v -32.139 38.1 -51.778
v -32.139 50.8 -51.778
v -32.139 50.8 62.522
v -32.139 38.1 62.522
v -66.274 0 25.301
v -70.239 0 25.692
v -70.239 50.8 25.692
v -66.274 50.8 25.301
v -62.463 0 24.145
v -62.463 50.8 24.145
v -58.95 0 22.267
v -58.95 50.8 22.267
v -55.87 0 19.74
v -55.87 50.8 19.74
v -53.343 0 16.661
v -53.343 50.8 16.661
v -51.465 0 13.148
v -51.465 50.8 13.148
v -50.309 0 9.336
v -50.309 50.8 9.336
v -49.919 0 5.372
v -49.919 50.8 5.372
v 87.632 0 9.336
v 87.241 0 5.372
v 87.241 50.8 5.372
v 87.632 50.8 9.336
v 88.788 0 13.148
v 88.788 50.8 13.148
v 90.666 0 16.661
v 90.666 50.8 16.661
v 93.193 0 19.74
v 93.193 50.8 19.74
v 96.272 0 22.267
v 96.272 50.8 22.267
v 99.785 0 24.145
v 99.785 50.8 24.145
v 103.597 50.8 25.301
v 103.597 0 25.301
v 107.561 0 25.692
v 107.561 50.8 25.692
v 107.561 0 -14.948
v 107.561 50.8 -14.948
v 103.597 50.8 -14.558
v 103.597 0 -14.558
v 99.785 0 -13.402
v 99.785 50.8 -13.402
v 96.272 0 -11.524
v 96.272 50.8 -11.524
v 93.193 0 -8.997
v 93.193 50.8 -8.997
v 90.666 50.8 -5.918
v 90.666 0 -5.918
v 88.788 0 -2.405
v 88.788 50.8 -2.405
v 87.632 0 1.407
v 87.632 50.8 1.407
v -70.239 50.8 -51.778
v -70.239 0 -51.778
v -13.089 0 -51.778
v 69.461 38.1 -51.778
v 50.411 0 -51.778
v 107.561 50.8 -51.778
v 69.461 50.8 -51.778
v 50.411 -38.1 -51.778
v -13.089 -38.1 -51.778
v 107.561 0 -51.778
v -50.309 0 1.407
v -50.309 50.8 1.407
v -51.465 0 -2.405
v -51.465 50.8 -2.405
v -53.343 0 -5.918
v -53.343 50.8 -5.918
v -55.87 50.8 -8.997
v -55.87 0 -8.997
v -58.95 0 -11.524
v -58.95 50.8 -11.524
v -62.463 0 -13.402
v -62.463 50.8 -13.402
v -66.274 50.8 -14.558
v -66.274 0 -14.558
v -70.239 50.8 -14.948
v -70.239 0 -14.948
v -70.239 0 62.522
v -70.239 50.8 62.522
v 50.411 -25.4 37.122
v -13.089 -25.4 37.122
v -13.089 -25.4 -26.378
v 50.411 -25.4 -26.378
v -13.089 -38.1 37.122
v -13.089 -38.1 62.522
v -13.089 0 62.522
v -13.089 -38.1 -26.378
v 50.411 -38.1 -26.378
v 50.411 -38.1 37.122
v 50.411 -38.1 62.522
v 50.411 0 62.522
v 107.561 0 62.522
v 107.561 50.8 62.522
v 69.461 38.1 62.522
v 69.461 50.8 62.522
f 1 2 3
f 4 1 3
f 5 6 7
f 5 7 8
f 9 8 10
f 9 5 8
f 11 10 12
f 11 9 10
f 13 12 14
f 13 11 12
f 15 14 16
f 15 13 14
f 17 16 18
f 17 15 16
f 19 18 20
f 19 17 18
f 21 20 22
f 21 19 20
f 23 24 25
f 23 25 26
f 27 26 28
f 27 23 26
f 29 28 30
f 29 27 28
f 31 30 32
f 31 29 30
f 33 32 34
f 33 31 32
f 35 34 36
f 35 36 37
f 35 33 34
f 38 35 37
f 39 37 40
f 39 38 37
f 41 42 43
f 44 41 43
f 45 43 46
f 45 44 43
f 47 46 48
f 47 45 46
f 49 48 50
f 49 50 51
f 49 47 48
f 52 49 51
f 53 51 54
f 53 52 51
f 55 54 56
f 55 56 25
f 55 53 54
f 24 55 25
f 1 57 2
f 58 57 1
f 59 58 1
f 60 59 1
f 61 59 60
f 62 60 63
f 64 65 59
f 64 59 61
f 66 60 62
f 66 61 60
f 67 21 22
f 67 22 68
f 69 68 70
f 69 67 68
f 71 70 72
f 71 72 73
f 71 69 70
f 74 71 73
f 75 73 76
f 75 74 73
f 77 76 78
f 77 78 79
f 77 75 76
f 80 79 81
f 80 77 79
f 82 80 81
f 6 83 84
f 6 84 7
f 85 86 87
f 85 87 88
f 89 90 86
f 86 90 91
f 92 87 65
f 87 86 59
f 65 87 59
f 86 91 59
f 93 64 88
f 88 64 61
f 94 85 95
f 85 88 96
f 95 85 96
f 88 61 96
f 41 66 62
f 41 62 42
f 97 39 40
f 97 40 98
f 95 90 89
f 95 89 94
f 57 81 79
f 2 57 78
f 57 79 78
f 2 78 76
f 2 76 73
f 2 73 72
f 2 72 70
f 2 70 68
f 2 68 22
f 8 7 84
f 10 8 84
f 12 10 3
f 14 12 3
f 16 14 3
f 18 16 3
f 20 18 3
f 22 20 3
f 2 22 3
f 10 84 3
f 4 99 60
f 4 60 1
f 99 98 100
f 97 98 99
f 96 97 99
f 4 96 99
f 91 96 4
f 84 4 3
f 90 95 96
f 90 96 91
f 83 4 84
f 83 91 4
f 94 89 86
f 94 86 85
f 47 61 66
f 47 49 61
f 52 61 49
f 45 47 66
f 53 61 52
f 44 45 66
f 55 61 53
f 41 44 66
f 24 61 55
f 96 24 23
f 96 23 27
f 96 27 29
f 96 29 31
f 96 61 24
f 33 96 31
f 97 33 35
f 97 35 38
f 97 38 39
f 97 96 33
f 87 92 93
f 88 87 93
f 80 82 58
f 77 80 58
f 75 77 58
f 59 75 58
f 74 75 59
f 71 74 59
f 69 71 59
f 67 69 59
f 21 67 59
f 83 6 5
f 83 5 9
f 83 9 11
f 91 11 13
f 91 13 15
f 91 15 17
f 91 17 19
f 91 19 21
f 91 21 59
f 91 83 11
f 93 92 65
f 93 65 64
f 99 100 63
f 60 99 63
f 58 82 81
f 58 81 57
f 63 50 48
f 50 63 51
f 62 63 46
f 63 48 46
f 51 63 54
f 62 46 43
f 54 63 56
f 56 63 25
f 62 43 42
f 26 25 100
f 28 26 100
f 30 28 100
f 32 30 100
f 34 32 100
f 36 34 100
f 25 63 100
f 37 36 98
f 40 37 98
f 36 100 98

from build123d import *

# Parameters (mm, degrees)
F0_W     = 31.75
F0_H     = 57.15
F1_DEPTH = 50.8
F2_W     = 31.75
F2_H     = 25.4
F2_H_2   = 63.5
F3_DEPTH = 38.1
F4_W     = 63.5
F4_H     = 63.5
F5_DEPTH = 12.7
F7_DEPTH = 12.7


with BuildPart() as f1:
    # F0 (on Front) → F1 (new body)
    with BuildSketch(Plane.XZ):
        with BuildLine():
            Line((-13.088717841, 62.5215394646), (-70.238717841, 62.5215394646))
            Line((-70.238717841, 62.5215394646), (-70.238717841, 25.6915394646))
            ThreePointArc((-70.238717841, 25.6915394646), (-55.8703080473, 19.7399492583), (-49.918717841, 5.3715394646))
            Line((-49.918717841, 5.3715394646), (-13.088717841, 5.3715394646))
            Line((-13.088717841, 5.3715394646), (-13.088717841, 62.5215394646))
        make_face()
        with BuildLine():
            Line((-13.088717841, -51.7784605354), (-13.088717841, 5.3715394646))
            Line((-13.088717841, 5.3715394646), (-49.918717841, 5.3715394646))
            ThreePointArc((-49.918717841, 5.3715394646), (-55.8703080473, -8.9968703291), (-70.238717841, -14.9484605354))
            Line((-70.238717841, -14.9484605354), (-70.238717841, -51.7784605354))
            Line((-70.238717841, -51.7784605354), (-13.088717841, -51.7784605354))
        make_face()
        with BuildLine():
            Line((87.241282159, 5.3715394646), (50.411282159, 5.3715394646))
            Line((50.411282159, 5.3715394646), (50.411282159, -51.7784605354))
            Line((50.411282159, -51.7784605354), (107.561282159, -51.7784605354))
            Line((107.561282159, -51.7784605354), (107.561282159, -14.9484605354))
            ThreePointArc((107.561282159, -14.9484605354), (93.1928723653, -8.9968703291), (87.241282159, 5.3715394646))
        make_face()
        with BuildLine():
            Line((107.561282159, 62.5215394646), (50.411282159, 62.5215394646))
            Line((50.411282159, 62.5215394646), (50.411282159, 5.3715394646))
            Line((50.411282159, 5.3715394646), (87.241282159, 5.3715394646))
            ThreePointArc((87.241282159, 5.3715394646), (93.1928723653, 19.7399492583), (107.561282159, 25.6915394646))
            Line((107.561282159, 25.6915394646), (107.561282159, 62.5215394646))
        make_face()
        with Locations((2.786282159, 33.9465394646)):
            Rectangle(F0_W, F0_H)
        with Locations((2.786282159, -23.2034605354)):
            Rectangle(F0_W, F0_H)
        with Locations((34.536282159, -23.2034605354)):
            Rectangle(F0_W, F0_H)
        with Locations((34.536282159, 33.9465394646)):
            Rectangle(F0_W, F0_H)
    extrude(amount=-F1_DEPTH)

    # F2 (on face) → F3 (join)
    with BuildSketch(Plane.XZ):
        with Locations((34.536282159, 49.8215394646)):
            Rectangle(F2_W, F2_H)
        with Locations((2.786282159, 49.8215394646)):
            Rectangle(F2_W, F2_H)
        with Locations((2.786282159, -39.0784605354)):
            Rectangle(F2_W, F2_H)
        with Locations((34.536282159, -39.0784605354)):
            Rectangle(F2_W, F2_H)
        with Locations((34.536282159, 5.3715394646)):
            Rectangle(F2_W, F2_H_2)
        with Locations((2.786282159, 5.3715394646)):
            Rectangle(F2_W, F2_H_2)
    extrude(amount=F3_DEPTH)

    # F4 (on face) → F5 (cut)
    with BuildSketch(Plane.XZ.offset(38.1)):
        with Locations((18.661282159, 5.3715394646)):
            Rectangle(F4_W, F4_H)
    extrude(amount=-F5_DEPTH, mode=Mode.SUBTRACT)

    # F6 (on face) → F7 (cut)
    with BuildSketch(Plane(origin=(0, 50.8, 0), x_dir=(-1, 0, 0), z_dir=(0, 1, 0))):
        Polygon((32.138717841, 62.5215394646), (-18.661282159, 62.5215394646), (-69.461282159, 62.5215394646), (-69.461282159, -51.7784605354), (-54.4542595744, -51.7784605354), (-51.7406947911, -51.7784605354), (32.138717841, -51.7784605354), align=None)
    extrude(amount=-F7_DEPTH, mode=Mode.SUBTRACT)


solid = f1.part
